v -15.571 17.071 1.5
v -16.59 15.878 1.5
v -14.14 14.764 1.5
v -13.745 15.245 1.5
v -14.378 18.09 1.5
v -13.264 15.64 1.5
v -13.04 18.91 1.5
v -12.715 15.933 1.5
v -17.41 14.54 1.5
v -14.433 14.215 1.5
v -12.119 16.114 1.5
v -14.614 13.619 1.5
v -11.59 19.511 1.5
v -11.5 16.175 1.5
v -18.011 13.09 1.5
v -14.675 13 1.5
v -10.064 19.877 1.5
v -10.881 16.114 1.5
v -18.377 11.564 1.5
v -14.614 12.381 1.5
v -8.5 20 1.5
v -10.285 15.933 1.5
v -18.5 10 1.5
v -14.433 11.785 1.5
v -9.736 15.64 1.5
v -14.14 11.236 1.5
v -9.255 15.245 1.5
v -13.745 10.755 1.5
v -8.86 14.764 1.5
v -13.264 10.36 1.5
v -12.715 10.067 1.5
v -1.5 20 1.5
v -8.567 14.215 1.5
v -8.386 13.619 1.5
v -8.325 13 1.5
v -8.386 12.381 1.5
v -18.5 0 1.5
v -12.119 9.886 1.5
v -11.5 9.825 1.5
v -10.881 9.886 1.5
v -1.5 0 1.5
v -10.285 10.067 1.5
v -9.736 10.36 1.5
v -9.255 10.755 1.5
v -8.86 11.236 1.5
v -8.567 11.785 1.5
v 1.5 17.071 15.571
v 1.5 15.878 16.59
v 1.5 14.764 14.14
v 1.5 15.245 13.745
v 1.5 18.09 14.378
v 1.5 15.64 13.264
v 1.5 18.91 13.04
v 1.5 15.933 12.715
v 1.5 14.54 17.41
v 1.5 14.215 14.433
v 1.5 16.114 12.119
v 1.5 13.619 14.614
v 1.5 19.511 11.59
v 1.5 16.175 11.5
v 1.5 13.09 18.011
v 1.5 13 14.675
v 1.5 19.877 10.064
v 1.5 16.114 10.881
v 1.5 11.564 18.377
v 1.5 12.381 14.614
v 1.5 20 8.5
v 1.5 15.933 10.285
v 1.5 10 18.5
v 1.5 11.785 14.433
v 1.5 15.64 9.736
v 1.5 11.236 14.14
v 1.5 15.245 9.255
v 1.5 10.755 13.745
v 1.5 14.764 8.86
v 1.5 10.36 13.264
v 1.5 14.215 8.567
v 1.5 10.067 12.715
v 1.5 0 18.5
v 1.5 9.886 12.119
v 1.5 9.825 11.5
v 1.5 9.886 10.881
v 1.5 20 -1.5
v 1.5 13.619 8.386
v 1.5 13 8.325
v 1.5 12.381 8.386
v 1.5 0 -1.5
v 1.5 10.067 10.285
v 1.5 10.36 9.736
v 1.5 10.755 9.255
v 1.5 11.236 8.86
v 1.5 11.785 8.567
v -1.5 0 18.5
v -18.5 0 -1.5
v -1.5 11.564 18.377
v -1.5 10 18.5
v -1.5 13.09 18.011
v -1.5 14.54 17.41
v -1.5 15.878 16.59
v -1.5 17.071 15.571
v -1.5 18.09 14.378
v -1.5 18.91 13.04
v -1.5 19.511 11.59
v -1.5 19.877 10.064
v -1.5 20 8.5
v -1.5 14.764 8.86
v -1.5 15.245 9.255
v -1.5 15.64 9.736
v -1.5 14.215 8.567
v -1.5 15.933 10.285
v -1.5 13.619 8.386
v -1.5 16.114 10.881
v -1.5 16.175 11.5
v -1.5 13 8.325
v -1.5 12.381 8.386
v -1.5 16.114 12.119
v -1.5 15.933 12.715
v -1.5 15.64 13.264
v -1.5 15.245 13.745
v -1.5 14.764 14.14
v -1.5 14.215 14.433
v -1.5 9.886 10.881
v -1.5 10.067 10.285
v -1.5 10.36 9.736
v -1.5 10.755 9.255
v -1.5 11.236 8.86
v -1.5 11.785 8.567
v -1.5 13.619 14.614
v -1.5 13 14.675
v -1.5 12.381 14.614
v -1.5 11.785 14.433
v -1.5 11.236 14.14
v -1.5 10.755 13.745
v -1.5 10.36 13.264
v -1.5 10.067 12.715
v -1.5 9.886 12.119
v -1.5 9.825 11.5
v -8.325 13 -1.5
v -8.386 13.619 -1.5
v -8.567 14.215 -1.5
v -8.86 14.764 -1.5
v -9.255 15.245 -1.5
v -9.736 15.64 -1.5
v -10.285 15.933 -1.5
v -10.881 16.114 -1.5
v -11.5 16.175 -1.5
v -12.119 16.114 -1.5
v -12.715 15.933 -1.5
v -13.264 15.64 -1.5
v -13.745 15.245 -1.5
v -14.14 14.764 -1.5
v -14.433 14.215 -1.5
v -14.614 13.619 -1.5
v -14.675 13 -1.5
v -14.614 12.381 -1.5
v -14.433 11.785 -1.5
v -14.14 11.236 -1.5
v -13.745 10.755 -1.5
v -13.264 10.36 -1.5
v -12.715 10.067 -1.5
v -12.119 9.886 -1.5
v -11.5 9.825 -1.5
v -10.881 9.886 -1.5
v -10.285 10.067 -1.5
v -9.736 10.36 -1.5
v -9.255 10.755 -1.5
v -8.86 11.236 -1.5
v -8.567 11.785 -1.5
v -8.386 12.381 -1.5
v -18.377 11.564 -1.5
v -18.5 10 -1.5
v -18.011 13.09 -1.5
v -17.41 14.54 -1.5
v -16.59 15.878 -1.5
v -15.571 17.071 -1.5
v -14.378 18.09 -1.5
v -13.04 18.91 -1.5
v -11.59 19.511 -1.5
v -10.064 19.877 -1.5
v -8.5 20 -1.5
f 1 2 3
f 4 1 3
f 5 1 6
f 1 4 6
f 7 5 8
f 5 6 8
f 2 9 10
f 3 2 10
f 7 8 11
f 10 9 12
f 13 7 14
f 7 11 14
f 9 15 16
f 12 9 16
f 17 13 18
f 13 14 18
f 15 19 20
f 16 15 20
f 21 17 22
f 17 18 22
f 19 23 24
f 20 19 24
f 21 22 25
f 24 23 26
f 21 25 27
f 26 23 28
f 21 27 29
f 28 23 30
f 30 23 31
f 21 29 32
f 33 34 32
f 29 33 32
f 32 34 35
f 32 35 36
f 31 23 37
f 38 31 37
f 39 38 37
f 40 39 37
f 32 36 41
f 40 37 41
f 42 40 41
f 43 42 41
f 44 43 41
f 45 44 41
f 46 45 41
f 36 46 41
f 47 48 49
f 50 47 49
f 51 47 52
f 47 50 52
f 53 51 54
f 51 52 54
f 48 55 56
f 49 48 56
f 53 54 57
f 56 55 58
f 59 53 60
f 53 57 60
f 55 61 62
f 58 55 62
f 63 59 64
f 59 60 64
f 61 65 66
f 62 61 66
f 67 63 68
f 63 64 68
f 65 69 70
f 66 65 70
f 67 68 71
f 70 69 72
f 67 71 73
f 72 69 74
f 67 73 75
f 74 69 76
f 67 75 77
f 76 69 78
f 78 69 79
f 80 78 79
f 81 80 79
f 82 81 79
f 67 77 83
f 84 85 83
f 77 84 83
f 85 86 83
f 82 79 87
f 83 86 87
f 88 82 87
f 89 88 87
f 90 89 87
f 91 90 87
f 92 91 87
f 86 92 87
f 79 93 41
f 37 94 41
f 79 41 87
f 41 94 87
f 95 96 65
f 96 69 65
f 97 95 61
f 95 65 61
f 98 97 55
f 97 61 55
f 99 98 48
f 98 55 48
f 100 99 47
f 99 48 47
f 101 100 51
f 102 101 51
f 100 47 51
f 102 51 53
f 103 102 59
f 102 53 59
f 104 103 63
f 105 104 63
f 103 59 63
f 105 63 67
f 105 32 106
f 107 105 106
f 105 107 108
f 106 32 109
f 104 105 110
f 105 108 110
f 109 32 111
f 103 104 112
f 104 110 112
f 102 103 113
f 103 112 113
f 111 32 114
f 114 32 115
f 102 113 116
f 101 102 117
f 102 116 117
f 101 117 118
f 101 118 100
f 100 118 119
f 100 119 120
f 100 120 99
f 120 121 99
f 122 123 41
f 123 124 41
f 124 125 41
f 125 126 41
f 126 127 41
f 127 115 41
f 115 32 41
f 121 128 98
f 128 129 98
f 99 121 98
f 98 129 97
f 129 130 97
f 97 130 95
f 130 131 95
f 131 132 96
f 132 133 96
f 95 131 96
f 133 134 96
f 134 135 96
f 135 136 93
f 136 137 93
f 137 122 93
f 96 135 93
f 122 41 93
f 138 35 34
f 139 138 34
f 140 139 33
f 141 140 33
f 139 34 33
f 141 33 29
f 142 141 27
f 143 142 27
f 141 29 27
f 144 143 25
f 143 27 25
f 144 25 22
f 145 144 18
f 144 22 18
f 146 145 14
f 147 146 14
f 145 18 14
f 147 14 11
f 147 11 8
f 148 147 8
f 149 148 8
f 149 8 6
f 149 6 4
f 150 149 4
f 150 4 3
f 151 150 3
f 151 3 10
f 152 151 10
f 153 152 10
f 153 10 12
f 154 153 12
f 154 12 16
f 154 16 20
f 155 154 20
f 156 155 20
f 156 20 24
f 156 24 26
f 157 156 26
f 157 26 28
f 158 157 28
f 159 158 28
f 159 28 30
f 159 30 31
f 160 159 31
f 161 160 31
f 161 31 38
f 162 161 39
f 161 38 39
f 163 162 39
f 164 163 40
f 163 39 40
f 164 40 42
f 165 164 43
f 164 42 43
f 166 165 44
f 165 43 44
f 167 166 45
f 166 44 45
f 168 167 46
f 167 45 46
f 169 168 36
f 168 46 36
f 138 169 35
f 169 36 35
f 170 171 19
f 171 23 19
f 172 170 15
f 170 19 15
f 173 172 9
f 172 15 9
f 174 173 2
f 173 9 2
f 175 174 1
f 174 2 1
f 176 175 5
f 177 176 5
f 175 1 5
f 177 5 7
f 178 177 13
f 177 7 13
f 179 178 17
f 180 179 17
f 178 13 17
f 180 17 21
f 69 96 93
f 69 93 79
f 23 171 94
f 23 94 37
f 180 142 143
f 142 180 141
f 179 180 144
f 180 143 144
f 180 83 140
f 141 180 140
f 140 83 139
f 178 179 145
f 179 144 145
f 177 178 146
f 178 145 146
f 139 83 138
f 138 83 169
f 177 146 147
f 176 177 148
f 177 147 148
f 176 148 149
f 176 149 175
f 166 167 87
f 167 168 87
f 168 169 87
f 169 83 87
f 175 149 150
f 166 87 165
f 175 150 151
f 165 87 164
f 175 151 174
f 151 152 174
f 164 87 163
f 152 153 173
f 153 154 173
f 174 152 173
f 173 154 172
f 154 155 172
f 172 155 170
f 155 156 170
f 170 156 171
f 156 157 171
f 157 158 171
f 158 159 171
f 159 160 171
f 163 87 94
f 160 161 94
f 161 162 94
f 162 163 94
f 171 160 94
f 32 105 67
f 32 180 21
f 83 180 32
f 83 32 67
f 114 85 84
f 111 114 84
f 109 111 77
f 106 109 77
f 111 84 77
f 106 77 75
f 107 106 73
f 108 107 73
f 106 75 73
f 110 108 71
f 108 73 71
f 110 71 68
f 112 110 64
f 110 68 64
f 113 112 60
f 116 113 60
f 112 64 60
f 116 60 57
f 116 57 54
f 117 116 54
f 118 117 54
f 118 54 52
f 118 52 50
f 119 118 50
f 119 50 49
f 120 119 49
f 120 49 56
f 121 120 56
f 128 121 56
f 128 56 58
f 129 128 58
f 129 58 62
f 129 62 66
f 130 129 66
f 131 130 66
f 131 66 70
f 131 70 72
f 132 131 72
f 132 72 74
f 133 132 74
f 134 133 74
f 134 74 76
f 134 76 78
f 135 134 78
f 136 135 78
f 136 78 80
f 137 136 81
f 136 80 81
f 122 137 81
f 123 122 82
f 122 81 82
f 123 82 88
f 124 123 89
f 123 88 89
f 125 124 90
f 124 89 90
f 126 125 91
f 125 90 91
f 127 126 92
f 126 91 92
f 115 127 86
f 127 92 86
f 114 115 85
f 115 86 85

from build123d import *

# Parameters (mm, degrees)
BOSS_EXTRUDE1_DEPTH = 20
FILLET1_R           = 10
SKETCH2_R           = 3.175
CUT_EXTRUDE1_DEPTH  = 21
SKETCH3_R           = 3.175
CUT_EXTRUDE2_DEPTH  = 4


with BuildPart() as part:
    # Sketch1 → Boss-Extrude1 (new body)
    with BuildSketch(Plane(origin=(0, 0, 0), x_dir=(1, 0, 0), z_dir=(0, 1, 0))):
        Polygon((-18.5, -1.5), (-1.5, -1.5), (-1.5, -18.5), (1.5, -18.5), (1.5, 1.5), (-18.5, 1.5), align=None)
    extrude(amount=BOSS_EXTRUDE1_DEPTH)

    # Fillet1
    fillet1_edges = [part.edges().sort_by_distance(p)[0] for p in [
        (0, 20, 18.5),
        (-18.5, 20, 0),
    ]]
    fillet(fillet1_edges, radius=FILLET1_R)

    # Sketch2 → Cut-Extrude1 (cut, through all)
    with BuildSketch(Plane(origin=(1.5, 0, 0), x_dir=(0, 0, -1), z_dir=(1, 0, 0))):
        with Locations((-11.5, 13)):
            Circle(SKETCH2_R)
    extrude(amount=-CUT_EXTRUDE1_DEPTH, mode=Mode.SUBTRACT)

    # Sketch3 → Cut-Extrude2 (cut, through all)
    with BuildSketch(Plane.XY.offset(1.5)):
        with Locations((-11.5, 13)):
            Circle(SKETCH3_R)
    extrude(amount=-CUT_EXTRUDE2_DEPTH, mode=Mode.SUBTRACT)


solid = part.part
